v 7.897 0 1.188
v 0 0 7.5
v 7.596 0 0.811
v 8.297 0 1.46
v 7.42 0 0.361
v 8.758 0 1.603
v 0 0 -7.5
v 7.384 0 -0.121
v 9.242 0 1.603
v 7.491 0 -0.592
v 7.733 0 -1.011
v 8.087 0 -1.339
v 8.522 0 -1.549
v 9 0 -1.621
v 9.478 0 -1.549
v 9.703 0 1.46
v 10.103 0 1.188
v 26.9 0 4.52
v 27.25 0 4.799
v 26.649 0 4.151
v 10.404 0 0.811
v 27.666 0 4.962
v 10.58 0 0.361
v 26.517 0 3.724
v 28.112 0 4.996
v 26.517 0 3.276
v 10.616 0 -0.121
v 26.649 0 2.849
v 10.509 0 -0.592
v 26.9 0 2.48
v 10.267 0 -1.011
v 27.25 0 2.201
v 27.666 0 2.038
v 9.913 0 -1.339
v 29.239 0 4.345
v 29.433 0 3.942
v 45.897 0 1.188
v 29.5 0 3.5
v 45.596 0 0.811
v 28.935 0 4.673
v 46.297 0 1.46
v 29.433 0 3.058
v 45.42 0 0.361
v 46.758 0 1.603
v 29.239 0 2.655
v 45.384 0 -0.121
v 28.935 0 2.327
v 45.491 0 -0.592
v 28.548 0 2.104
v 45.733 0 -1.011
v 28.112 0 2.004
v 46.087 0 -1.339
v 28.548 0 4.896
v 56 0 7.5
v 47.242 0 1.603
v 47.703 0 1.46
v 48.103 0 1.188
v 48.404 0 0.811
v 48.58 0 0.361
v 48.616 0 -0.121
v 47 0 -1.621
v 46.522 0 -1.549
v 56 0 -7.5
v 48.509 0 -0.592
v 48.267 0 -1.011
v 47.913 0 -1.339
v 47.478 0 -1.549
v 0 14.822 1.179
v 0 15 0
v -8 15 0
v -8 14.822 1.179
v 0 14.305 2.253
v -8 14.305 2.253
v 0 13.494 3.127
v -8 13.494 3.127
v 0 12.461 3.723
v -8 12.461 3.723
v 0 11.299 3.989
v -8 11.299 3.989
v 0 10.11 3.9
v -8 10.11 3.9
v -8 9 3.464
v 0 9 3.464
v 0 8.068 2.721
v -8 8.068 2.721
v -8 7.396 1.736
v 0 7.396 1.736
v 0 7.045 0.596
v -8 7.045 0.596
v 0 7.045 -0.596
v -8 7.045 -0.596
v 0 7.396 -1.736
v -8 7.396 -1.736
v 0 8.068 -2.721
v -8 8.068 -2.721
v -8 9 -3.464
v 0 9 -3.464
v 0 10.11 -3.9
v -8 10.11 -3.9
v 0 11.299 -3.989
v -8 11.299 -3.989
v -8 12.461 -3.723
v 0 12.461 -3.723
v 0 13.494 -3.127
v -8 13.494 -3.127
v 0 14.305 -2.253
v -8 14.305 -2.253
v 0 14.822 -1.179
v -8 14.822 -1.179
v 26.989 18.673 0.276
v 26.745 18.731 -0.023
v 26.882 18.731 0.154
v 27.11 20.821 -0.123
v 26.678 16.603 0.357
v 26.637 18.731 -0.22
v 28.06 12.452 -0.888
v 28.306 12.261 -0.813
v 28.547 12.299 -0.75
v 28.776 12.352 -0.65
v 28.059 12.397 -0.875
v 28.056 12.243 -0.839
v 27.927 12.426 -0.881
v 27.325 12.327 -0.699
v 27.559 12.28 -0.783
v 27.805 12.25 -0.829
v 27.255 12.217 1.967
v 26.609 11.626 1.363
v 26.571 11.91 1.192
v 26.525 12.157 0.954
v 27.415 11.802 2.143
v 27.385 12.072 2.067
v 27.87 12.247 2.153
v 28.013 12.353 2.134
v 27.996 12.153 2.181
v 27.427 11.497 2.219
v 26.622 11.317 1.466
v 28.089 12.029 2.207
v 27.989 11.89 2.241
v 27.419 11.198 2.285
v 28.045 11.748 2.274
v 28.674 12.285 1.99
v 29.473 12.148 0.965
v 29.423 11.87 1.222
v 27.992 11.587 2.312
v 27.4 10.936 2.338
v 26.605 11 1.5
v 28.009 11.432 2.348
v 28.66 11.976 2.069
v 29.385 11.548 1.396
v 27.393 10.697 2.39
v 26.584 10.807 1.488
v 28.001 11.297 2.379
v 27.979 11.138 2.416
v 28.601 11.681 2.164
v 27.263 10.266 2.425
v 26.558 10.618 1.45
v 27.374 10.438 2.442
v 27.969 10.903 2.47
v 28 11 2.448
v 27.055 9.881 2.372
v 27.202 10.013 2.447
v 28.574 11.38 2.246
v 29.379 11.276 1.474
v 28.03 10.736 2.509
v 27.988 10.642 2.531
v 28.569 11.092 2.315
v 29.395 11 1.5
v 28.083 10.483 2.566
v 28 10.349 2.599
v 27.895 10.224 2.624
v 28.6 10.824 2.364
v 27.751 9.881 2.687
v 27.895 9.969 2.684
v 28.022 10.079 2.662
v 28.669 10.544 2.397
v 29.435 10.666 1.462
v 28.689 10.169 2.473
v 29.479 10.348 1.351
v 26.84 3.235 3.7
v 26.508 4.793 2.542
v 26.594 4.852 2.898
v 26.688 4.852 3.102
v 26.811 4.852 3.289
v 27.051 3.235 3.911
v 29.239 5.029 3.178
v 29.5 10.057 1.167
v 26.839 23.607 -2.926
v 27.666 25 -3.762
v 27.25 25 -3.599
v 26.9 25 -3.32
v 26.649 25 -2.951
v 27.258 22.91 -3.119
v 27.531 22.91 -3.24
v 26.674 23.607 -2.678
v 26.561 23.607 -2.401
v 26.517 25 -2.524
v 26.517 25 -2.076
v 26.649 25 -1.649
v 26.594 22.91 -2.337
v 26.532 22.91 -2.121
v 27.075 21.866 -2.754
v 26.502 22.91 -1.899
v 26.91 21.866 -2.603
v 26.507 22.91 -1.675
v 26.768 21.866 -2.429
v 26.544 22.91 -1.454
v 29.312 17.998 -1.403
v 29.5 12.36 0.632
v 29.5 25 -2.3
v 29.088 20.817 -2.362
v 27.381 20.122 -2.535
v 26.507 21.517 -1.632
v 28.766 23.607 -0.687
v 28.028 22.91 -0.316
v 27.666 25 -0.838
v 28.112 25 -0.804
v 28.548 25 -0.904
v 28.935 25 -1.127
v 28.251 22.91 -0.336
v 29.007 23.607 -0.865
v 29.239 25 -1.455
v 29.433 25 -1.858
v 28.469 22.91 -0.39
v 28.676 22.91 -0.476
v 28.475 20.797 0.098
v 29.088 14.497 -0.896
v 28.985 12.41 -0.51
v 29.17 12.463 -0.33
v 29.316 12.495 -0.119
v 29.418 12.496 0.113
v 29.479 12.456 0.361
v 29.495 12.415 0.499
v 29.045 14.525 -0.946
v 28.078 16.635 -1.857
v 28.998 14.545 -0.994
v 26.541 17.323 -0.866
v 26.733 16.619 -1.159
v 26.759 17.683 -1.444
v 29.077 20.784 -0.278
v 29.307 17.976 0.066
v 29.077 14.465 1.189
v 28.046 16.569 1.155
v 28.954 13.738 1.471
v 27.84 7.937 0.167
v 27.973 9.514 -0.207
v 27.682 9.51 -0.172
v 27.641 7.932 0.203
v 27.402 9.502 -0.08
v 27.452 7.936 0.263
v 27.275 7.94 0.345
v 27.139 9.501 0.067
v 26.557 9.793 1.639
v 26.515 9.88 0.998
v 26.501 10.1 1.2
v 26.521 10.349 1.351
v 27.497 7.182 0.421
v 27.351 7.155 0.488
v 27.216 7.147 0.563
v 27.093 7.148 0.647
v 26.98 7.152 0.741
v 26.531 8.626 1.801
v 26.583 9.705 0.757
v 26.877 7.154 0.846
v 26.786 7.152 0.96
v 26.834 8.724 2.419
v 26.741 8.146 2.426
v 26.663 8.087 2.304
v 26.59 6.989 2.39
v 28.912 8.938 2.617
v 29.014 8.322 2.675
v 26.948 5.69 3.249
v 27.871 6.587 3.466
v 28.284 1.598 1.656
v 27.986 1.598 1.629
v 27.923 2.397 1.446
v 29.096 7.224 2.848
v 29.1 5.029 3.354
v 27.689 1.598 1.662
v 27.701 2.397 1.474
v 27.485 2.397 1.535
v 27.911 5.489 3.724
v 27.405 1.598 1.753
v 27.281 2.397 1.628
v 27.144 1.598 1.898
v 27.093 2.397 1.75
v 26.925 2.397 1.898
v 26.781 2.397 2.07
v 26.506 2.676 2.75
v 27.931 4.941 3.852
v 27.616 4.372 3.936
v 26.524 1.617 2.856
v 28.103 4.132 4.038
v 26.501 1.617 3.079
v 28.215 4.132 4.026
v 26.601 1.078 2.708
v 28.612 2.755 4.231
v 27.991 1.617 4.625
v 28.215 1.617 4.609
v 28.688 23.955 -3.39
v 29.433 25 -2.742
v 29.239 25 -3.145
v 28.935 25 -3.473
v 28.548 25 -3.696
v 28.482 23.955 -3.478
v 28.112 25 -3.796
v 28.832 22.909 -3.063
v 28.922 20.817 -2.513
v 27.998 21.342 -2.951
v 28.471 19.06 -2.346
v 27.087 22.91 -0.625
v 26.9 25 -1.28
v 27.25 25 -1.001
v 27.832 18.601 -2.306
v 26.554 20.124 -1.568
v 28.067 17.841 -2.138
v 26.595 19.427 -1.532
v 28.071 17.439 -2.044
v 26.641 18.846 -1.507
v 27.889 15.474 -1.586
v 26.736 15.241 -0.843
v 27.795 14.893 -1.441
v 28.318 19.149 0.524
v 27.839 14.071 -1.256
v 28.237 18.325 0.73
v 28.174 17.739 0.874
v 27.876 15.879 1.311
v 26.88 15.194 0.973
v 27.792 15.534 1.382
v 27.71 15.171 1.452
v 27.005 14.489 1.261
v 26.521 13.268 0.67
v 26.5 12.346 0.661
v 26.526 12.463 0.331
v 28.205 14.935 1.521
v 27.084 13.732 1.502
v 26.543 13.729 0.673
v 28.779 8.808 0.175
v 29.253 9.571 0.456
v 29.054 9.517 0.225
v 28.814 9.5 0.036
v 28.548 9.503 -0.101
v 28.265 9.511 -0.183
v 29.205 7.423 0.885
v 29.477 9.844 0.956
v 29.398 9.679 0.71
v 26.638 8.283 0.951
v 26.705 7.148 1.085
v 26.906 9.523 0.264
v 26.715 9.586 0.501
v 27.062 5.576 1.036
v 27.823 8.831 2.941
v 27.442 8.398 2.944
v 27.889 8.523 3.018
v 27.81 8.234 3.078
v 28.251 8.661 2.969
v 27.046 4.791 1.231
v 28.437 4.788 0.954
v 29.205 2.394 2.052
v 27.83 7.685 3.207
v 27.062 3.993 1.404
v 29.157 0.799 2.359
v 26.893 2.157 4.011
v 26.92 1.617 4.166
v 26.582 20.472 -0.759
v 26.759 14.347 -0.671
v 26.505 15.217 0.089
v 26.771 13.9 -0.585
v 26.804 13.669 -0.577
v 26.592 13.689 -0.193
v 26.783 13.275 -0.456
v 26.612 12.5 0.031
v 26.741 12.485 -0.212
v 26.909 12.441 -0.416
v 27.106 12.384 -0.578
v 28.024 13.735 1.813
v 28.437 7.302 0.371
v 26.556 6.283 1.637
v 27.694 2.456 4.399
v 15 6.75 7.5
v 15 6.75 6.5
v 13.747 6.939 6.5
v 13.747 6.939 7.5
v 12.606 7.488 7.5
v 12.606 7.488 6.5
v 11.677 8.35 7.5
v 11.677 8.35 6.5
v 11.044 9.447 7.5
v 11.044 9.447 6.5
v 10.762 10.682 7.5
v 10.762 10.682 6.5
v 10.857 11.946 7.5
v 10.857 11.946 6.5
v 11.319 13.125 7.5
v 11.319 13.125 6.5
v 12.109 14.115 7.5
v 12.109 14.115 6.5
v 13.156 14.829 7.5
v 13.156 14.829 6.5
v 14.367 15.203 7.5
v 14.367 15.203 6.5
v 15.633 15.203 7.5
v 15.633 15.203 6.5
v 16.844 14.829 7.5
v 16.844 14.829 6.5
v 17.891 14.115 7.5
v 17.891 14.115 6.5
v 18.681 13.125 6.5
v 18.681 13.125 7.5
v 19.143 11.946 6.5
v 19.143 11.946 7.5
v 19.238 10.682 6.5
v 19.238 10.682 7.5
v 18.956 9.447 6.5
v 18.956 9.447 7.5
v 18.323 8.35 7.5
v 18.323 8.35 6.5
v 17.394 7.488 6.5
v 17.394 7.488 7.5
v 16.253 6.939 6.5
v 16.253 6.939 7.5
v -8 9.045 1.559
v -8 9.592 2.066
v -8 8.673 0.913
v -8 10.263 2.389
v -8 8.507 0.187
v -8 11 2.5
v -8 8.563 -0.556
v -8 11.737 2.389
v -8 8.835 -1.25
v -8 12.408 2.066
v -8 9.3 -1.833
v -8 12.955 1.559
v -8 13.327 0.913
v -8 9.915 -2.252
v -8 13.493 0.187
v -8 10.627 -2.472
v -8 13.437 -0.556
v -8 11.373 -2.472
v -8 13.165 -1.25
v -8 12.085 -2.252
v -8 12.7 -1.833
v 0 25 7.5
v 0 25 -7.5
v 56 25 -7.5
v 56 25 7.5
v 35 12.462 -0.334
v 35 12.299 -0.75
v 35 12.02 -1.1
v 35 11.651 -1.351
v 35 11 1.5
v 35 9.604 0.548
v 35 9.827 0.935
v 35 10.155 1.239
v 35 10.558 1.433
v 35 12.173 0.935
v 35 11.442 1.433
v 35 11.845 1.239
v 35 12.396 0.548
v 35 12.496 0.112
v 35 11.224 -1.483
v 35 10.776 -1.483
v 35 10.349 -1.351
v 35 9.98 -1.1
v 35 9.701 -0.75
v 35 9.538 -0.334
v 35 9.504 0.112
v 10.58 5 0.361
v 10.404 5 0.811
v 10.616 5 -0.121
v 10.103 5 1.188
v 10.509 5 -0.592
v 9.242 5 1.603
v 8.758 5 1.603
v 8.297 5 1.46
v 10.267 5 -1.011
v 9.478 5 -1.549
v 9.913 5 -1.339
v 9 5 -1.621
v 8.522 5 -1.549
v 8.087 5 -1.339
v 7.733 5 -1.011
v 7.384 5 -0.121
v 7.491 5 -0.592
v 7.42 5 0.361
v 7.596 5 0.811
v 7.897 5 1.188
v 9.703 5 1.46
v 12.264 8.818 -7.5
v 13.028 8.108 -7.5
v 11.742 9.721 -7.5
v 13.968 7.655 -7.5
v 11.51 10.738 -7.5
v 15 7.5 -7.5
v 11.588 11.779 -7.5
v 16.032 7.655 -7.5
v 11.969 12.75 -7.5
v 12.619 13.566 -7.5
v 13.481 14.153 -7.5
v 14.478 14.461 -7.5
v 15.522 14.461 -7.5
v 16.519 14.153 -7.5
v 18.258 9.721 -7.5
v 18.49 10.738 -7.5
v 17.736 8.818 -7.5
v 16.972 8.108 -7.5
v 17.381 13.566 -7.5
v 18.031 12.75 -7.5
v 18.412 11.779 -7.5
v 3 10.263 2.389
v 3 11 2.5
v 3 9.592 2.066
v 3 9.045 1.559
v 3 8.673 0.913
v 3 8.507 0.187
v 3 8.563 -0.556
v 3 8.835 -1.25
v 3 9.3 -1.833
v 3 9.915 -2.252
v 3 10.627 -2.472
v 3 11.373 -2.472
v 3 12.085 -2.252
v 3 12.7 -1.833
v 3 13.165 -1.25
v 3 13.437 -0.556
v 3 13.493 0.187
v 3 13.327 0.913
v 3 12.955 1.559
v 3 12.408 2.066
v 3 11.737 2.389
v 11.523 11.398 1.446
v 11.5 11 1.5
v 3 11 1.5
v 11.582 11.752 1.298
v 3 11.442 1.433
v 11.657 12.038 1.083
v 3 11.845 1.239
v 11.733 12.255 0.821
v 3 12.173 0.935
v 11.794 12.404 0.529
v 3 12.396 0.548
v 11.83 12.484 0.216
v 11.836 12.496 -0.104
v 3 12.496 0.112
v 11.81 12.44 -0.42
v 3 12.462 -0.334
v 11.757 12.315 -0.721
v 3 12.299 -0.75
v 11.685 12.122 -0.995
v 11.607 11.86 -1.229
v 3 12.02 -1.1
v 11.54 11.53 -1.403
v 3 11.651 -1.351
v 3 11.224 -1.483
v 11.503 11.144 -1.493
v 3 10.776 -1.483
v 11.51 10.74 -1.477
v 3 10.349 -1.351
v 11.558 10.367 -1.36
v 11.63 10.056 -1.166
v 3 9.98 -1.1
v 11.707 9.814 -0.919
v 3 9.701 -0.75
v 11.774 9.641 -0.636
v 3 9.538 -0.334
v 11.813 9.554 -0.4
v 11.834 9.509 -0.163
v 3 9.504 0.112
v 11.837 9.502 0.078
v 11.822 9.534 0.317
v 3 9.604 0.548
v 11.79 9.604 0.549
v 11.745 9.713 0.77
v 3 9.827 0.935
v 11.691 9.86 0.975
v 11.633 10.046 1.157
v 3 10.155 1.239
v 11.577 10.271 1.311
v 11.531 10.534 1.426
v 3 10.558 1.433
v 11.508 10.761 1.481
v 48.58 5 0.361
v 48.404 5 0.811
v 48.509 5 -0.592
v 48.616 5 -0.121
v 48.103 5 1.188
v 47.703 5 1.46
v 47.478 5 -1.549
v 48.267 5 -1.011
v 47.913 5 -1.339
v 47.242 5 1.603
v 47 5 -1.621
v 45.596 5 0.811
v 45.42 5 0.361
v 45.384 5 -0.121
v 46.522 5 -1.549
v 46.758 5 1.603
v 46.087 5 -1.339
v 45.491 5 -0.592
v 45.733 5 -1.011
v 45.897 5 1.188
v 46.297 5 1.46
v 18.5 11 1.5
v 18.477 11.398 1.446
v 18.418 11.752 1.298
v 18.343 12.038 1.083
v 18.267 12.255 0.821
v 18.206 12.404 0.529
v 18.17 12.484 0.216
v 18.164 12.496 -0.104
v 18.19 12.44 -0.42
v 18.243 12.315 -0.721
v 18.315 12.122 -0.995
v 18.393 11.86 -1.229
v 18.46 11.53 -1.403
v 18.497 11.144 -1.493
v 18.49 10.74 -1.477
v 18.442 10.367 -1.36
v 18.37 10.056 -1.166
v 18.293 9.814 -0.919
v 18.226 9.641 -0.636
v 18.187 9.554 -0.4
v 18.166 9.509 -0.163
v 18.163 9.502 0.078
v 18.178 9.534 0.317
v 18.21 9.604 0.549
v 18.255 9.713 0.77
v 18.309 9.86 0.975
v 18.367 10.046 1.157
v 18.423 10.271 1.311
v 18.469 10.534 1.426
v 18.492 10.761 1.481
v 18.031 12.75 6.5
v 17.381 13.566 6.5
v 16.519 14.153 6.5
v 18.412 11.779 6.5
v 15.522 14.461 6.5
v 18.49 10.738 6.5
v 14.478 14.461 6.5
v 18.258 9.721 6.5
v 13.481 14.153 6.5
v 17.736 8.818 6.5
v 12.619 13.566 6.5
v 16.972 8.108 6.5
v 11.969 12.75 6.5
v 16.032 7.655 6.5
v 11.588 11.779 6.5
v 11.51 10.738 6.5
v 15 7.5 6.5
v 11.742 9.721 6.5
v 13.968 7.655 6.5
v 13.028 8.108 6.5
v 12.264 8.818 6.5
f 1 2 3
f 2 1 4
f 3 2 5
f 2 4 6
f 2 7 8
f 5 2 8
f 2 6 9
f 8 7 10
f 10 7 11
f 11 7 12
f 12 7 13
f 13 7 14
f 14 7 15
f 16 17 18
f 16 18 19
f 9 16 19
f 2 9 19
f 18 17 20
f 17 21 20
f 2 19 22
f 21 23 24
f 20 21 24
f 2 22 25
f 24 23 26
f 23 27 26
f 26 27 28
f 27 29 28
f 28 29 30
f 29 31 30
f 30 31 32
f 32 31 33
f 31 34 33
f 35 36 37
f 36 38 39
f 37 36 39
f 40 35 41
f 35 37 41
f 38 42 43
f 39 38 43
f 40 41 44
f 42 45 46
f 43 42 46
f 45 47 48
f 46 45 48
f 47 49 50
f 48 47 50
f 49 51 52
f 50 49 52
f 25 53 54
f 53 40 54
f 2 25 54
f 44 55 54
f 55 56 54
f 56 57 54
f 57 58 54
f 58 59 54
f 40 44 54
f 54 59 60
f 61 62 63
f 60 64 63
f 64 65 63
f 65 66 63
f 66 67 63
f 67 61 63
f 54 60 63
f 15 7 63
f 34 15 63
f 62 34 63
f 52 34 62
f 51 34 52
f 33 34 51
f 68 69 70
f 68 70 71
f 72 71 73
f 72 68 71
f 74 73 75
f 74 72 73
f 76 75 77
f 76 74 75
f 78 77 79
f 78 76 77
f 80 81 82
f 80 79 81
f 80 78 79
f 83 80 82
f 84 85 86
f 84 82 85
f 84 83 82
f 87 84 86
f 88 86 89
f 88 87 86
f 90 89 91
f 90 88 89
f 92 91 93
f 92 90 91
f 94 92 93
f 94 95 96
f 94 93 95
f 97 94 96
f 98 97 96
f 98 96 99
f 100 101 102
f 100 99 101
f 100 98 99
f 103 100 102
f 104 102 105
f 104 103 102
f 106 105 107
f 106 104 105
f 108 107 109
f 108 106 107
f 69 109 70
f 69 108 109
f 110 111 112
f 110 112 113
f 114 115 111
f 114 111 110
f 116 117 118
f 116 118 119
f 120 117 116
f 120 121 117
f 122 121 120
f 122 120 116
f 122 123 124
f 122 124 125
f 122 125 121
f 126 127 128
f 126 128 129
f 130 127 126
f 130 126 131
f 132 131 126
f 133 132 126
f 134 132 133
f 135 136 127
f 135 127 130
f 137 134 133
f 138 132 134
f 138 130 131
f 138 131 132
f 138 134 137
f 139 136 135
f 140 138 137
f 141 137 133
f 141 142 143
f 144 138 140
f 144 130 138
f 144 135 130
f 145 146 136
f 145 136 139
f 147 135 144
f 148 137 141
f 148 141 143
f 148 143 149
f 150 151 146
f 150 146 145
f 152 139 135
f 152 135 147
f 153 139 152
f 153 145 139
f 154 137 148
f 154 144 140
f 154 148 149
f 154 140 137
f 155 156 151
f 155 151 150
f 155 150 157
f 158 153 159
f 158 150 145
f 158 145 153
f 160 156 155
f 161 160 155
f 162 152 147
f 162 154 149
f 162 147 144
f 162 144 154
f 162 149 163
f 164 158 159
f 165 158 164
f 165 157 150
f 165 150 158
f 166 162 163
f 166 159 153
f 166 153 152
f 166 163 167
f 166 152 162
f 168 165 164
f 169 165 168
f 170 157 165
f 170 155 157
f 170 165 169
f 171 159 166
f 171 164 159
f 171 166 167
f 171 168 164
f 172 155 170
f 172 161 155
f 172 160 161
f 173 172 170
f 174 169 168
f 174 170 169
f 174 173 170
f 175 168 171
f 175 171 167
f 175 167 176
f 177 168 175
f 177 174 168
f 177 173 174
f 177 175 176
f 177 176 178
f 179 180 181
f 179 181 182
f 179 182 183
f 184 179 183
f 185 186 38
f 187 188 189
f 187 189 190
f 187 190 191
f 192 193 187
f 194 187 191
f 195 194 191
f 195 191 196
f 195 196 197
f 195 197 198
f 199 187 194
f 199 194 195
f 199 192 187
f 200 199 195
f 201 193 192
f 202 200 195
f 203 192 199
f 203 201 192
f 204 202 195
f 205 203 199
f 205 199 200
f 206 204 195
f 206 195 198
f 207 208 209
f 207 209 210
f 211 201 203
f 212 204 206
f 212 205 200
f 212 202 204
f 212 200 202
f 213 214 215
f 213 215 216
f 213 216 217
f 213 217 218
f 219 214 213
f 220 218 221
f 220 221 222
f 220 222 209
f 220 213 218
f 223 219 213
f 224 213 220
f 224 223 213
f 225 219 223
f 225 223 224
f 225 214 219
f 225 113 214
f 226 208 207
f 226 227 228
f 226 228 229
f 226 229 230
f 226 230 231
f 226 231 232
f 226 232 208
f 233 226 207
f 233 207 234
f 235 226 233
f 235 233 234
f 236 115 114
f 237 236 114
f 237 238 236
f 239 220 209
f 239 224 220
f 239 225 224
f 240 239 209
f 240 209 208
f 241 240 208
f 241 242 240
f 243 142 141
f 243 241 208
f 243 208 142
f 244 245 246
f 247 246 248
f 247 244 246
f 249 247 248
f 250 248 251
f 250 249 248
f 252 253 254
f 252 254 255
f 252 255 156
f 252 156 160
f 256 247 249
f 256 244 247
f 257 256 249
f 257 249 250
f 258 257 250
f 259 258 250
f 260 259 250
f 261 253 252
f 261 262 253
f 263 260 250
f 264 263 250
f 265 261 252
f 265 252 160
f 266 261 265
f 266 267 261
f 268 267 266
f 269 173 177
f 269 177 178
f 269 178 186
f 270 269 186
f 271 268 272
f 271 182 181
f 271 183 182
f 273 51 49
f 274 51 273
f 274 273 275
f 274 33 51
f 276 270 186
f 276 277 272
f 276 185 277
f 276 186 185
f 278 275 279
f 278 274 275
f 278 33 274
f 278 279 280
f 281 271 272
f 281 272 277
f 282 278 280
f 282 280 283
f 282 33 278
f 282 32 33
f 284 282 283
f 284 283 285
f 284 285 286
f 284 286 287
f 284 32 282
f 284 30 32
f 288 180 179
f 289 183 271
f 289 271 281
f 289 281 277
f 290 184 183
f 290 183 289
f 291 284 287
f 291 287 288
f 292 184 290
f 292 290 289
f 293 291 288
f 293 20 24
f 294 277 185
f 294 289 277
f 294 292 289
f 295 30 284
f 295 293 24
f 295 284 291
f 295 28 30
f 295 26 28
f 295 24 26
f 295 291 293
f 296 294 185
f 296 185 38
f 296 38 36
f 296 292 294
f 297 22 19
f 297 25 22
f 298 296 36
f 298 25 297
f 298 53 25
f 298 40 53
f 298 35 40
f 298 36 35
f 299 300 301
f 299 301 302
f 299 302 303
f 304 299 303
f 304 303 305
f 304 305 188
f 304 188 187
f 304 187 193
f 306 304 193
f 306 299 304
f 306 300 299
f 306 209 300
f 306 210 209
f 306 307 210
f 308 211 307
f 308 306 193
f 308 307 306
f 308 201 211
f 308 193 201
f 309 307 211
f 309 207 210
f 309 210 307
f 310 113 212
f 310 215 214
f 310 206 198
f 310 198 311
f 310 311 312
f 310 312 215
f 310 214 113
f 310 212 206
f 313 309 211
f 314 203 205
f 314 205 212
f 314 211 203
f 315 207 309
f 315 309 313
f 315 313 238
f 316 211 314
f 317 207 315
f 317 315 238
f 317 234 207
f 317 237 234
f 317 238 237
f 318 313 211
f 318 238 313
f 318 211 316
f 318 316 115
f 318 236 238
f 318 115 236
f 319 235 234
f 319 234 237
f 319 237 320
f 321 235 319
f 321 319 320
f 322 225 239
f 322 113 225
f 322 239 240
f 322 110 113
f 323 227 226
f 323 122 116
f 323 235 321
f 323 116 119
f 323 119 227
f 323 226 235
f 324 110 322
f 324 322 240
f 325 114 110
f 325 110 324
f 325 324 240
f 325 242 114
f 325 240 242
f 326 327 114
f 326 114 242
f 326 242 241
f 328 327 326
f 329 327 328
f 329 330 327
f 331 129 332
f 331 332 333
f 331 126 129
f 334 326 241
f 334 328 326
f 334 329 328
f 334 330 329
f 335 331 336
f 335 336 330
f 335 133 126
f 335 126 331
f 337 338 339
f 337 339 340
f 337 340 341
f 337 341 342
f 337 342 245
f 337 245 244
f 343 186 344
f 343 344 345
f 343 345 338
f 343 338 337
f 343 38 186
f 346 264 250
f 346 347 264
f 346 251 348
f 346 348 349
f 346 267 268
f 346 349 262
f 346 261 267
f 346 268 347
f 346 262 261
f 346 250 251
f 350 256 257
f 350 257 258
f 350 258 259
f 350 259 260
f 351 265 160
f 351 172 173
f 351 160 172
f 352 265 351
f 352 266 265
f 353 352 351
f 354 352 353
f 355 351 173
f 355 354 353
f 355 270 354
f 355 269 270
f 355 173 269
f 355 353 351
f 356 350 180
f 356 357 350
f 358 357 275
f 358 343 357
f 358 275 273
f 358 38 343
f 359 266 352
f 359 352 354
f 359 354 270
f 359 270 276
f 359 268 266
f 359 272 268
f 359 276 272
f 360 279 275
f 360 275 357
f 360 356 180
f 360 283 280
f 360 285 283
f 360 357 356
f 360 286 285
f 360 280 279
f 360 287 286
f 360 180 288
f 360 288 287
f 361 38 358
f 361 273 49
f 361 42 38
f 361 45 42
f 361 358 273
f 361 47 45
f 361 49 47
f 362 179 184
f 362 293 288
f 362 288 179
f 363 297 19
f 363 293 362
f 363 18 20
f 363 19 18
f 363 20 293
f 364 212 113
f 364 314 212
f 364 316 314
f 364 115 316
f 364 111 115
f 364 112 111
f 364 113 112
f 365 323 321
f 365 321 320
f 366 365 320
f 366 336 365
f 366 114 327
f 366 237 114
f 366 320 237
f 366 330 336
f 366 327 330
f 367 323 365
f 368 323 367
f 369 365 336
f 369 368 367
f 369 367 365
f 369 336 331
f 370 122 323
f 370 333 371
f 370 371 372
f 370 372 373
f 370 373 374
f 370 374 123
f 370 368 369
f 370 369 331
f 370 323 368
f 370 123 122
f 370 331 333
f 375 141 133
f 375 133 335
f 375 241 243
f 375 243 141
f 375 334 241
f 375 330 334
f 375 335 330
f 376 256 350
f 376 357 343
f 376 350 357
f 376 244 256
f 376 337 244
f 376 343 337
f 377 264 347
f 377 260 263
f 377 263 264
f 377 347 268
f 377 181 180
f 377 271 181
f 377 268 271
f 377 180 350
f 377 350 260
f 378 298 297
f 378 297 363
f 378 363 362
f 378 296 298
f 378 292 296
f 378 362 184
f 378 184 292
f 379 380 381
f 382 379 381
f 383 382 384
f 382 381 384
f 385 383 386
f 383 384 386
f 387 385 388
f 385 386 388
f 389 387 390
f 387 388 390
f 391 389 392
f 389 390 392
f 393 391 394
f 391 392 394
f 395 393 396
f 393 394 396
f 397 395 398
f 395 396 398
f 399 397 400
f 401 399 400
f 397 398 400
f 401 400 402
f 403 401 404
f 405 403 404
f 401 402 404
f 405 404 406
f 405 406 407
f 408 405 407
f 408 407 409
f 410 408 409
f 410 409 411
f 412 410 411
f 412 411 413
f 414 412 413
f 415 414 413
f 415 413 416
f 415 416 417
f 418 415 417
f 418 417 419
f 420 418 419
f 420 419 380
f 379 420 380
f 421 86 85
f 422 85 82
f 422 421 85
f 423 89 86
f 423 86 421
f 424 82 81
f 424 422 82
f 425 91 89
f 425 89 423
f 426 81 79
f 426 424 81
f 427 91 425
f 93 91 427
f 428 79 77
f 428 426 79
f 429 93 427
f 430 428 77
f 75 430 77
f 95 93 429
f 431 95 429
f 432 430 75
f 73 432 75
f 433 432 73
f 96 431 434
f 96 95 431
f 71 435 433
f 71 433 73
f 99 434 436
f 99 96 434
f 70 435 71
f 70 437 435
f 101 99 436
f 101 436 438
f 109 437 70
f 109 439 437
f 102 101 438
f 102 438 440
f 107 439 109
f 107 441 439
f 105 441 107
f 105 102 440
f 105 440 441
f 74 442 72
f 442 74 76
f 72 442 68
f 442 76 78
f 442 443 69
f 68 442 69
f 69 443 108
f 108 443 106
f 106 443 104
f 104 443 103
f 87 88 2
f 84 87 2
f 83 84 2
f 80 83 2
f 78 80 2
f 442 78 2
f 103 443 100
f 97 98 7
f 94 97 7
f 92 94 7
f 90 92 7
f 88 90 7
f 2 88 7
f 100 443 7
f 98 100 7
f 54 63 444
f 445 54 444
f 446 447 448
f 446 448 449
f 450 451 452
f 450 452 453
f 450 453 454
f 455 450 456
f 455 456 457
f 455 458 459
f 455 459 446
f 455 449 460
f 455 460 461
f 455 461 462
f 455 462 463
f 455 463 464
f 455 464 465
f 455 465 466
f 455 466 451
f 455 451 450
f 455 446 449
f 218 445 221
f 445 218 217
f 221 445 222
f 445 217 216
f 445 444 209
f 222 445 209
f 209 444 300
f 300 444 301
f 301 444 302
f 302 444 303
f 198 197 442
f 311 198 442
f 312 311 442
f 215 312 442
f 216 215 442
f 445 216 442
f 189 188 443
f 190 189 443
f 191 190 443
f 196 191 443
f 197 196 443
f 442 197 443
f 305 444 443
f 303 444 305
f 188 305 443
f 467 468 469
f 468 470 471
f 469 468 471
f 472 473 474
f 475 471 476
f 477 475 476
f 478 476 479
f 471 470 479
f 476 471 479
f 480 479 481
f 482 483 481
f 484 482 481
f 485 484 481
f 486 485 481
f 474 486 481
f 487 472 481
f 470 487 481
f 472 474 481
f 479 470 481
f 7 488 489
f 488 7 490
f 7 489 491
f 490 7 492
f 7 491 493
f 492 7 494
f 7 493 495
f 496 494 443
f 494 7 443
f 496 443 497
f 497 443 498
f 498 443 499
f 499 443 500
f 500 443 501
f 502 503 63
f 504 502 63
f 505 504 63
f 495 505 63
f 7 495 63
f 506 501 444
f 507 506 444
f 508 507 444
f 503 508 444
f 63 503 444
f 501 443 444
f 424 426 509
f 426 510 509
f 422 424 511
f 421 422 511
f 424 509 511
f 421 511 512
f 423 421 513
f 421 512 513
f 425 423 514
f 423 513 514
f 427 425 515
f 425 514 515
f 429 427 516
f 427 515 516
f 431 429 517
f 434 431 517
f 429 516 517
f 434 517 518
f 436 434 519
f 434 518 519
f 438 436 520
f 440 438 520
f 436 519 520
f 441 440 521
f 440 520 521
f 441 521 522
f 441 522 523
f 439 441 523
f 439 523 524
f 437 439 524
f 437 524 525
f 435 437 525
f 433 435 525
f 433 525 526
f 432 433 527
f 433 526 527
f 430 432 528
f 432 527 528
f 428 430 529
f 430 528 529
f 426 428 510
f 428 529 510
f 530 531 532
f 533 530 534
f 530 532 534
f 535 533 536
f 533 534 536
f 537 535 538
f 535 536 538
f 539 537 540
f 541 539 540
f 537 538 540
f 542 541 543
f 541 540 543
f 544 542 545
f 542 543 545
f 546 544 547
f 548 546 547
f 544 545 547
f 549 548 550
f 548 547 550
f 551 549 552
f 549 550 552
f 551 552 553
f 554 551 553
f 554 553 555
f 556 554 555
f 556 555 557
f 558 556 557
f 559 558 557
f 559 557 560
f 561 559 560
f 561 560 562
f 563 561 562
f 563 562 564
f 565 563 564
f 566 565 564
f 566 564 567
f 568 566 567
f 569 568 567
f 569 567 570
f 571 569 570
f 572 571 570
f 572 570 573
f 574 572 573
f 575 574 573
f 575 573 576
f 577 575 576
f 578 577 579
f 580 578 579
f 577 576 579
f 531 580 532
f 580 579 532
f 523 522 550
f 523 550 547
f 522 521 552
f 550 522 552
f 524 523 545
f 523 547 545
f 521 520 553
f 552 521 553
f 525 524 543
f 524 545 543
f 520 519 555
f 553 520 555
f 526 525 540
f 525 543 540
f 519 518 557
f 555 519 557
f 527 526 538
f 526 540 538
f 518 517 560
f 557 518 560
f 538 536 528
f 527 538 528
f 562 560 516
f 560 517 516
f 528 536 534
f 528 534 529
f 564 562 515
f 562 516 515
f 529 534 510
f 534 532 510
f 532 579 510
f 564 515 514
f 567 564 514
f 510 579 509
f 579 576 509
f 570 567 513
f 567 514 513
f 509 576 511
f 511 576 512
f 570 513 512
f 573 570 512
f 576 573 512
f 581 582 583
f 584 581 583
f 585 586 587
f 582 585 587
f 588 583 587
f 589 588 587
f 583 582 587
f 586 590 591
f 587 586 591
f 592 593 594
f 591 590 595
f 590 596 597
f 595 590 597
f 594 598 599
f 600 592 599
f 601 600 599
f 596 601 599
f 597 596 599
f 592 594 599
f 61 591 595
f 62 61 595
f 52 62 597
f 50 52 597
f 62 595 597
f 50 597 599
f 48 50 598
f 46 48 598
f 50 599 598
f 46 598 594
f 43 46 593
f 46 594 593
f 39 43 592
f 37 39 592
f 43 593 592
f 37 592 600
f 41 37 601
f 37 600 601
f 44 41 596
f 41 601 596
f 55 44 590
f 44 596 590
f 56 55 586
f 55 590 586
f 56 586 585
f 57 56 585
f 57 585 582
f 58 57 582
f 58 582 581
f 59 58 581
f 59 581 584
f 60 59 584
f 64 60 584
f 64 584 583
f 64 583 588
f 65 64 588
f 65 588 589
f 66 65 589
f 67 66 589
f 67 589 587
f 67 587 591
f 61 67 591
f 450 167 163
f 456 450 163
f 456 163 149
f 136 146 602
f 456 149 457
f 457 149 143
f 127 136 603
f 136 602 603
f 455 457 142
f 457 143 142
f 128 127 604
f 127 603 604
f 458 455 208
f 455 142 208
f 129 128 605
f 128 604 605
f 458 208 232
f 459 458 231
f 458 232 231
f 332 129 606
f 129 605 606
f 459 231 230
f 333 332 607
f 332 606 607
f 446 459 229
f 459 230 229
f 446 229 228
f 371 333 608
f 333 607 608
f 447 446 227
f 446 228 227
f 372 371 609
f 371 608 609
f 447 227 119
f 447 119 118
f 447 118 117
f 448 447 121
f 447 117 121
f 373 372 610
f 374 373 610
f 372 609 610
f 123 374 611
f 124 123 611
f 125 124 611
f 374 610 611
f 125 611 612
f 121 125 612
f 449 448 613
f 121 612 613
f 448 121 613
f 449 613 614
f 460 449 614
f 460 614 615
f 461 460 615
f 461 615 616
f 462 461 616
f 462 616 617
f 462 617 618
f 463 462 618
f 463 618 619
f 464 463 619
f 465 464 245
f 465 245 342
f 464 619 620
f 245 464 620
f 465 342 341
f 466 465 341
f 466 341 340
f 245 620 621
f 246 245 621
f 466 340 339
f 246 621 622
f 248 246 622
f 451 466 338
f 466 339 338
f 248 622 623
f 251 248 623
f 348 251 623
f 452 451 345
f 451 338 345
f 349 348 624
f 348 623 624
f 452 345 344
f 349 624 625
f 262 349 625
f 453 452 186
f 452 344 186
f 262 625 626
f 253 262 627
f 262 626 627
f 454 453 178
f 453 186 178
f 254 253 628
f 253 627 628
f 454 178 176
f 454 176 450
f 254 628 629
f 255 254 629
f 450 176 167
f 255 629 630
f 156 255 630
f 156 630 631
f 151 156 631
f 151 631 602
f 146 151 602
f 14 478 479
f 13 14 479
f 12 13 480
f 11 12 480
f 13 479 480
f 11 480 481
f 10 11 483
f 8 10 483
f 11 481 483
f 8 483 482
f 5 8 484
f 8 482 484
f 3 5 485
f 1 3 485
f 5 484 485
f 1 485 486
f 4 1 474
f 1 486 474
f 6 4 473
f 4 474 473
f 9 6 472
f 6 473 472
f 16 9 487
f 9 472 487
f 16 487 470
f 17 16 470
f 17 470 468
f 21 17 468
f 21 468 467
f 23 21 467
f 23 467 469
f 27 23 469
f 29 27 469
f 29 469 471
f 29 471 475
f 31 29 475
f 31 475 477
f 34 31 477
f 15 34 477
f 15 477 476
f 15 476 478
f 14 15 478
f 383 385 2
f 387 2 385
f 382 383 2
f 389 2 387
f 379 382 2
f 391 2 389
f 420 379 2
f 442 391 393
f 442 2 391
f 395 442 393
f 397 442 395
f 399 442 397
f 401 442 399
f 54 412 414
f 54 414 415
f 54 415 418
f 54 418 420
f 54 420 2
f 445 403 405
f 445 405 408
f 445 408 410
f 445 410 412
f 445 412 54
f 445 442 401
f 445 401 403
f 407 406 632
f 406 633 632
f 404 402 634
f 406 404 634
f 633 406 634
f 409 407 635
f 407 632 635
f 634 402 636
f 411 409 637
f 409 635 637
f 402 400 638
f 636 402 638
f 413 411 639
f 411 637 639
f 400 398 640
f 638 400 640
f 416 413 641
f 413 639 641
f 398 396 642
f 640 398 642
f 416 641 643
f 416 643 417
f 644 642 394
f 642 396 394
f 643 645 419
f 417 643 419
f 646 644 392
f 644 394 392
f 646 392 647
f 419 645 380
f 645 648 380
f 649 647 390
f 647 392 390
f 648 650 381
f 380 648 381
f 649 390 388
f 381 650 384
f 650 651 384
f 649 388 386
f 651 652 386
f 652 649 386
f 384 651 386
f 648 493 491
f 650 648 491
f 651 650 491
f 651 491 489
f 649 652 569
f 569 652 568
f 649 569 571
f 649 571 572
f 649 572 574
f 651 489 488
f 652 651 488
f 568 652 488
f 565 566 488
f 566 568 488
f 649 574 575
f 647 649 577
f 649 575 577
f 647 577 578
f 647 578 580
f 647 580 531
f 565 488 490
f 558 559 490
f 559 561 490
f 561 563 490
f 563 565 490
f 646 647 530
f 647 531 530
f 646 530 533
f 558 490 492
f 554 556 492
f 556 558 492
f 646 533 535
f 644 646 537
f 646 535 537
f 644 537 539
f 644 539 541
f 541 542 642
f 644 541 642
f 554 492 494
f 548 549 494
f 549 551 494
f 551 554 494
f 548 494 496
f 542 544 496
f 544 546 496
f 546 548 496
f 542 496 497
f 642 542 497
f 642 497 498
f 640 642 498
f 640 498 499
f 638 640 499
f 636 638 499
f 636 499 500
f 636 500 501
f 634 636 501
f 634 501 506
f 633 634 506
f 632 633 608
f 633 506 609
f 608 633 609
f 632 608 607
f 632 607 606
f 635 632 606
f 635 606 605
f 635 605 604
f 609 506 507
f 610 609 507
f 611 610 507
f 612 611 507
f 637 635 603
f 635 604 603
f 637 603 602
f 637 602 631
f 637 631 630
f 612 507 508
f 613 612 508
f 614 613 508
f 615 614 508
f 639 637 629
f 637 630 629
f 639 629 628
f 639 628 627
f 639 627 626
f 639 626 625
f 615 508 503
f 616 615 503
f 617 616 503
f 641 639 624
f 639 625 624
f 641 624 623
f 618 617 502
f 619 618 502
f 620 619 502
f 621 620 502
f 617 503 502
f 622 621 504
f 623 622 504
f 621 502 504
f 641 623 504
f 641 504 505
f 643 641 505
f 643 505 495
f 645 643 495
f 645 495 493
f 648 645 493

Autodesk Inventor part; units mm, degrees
ref_plane "YZ Plane" through (0, 0, 0) normal (1, 0, 0) x (0, 1, 0)
sketch "Sketch1" plane through (0, 0, 0) normal (0, 0, 1) x (1, 0, 0)
  line L0 (0, 0) -> (56, 0)
  line L1 (56, 0) -> (56, 25)
  line L2 (56, 25) -> (0, 25)
  line L3 (0, 25) -> (0, 0)
  dimension "d0" = 56
  dimension "d1" = 25
extrude "Extrusion1" add sketch "Sketch1" along normal mid plane 15
sketch "Sketch2" plane through (0, 0, 7.5) normal (0, 0, 1) x (1, 0, 0)
  line L0 (0, 0) -> (56, 0) projected
  line L1 (0, 25) -> (0, 0) projected
  point P0 (15, 11)
  dimension "d4" = 11
  dimension "d5" = 15
hole "Hole1" at (15, 11, 7.5) direction (0, 0, -1) diameter 7 depth 15 counterbore diameter 8.5 counterbore depth 1
ref_plane "Work Plane1" through (0, 0, 0) normal (0, 0, 1) x (1, 0, 0)
sketch "Sketch3" plane through (0, 0, 0) normal (0, 0, 1) x (1, 0, 0)
  line L0 (1.4815, 11) -> (-8, 11)
  line L1 (-8, 11) -> (-8, 15)
  line L2 (-8, 15) -> (0, 15)
  line L3 (0, 16) -> (3, 16)
  line L4 (3, 16) -> (3, 11)
  line L5 (3, 11) -> (1.4815, 11)
  line L6 (0, 15) -> (0, 16)
  line L7 (0, 0) -> (0, 25) projected
  line L8 (56, 0) -> (0, 0) projected
  dimension "d14" = 8
  dimension "d15" = 11
  dimension "d16" = 3
  dimension "d17" = 11
  dimension "d18" = 10
revolve "Revolution1" add sketch "Sketch3" angle 360 about axis through (1.4815, 11, 0) along (-1, 0, 0)
sketch "Sketch4" plane through (-8, 11, 0) normal (-1, 0, 0) x (0, 0, 1)
  circle A0 centre (0, 0) radius 4 projected
  point P0 (0, -11)
hole "Hole2" at (-8, 11, 0) direction (1, 0, 0) diameter 5 depth 11
thread "Thread1"
sketch "Sketch6" plane through (0, 0, 7.5) normal (0, -1, 0) x (1, 0, 0)
  line L0 (0, -15) -> (0, 0) projected
  line L1 (56, 0) -> (56, -15) projected
  line L2 (0, 0) -> (56, 0) projected
  point P0 (0, -7.5)
  point P1 (9, -7.5)
  point P2 (47, -7.5)
  point P3 (0, -7.5)
  point P4 (56, -7.5)
  point P5 (28, 0)
  dimension "d29" = 38
  dimension "d30" = 19
hole "Hole3" at (9, 0, 0) at (47, 0, 0) direction (0, 1, 0) diameter 3.242 depth 5
ref_plane "Work Plane3" through (28, 0, 7.5) normal (1, 0, 0) x (0, 0, -1)
sketch "Sketch8" plane through (28, 0, 7.5) normal (1, 0, 0) x (0, 0, -1)
  line L0 (15, 25) -> (0, 25) projected
  line L1 (15, 0) -> (15, 25) projected
  line L2 (9.8, 25) -> (4, 0)
  line L3 (0, 25) -> (0, 0) projected
  line L4 (15, 0) -> (0, 0) projected
  point P0 (7.5, 0)
  dimension "d40" = 5.2
  dimension "d41" = 4
sketch "Sketch10" plane through (0, 25, 7.5) normal (0, 1, 0) x (1, 0, 0)
  circle A0 centre (28, 9.8) radius 1.5
  point P0 (0, 7.5)
  dimension "d42" = 3
sweep "Sweep1" cut profiles "Sketch10" path "Sketch8" path curves L2
sketch "Sketch12" plane through (3, 11, 0) normal (-1, 0, 0) x (0, 0, 1)
  line L0 (-7.5, 14) -> (7.5, 14) projected
  line L1 (7.5, -11) -> (7.5, 14) projected
  line L2 (7.5, -11) -> (-7.5, -11) projected
  line L3 (-7.5, 14) -> (-7.5, -11) projected
  circle A0 centre (0, 0) radius 1.5
  point P0 (0, -11)
  point P1 (0, 14)
  dimension "d45" = 3
  dimension "d46" = 11
extrude "Extrusion2" cut sketch "Sketch12" against normal blind 32 contours A0
properties part number "150" material "Steel, Cast"
